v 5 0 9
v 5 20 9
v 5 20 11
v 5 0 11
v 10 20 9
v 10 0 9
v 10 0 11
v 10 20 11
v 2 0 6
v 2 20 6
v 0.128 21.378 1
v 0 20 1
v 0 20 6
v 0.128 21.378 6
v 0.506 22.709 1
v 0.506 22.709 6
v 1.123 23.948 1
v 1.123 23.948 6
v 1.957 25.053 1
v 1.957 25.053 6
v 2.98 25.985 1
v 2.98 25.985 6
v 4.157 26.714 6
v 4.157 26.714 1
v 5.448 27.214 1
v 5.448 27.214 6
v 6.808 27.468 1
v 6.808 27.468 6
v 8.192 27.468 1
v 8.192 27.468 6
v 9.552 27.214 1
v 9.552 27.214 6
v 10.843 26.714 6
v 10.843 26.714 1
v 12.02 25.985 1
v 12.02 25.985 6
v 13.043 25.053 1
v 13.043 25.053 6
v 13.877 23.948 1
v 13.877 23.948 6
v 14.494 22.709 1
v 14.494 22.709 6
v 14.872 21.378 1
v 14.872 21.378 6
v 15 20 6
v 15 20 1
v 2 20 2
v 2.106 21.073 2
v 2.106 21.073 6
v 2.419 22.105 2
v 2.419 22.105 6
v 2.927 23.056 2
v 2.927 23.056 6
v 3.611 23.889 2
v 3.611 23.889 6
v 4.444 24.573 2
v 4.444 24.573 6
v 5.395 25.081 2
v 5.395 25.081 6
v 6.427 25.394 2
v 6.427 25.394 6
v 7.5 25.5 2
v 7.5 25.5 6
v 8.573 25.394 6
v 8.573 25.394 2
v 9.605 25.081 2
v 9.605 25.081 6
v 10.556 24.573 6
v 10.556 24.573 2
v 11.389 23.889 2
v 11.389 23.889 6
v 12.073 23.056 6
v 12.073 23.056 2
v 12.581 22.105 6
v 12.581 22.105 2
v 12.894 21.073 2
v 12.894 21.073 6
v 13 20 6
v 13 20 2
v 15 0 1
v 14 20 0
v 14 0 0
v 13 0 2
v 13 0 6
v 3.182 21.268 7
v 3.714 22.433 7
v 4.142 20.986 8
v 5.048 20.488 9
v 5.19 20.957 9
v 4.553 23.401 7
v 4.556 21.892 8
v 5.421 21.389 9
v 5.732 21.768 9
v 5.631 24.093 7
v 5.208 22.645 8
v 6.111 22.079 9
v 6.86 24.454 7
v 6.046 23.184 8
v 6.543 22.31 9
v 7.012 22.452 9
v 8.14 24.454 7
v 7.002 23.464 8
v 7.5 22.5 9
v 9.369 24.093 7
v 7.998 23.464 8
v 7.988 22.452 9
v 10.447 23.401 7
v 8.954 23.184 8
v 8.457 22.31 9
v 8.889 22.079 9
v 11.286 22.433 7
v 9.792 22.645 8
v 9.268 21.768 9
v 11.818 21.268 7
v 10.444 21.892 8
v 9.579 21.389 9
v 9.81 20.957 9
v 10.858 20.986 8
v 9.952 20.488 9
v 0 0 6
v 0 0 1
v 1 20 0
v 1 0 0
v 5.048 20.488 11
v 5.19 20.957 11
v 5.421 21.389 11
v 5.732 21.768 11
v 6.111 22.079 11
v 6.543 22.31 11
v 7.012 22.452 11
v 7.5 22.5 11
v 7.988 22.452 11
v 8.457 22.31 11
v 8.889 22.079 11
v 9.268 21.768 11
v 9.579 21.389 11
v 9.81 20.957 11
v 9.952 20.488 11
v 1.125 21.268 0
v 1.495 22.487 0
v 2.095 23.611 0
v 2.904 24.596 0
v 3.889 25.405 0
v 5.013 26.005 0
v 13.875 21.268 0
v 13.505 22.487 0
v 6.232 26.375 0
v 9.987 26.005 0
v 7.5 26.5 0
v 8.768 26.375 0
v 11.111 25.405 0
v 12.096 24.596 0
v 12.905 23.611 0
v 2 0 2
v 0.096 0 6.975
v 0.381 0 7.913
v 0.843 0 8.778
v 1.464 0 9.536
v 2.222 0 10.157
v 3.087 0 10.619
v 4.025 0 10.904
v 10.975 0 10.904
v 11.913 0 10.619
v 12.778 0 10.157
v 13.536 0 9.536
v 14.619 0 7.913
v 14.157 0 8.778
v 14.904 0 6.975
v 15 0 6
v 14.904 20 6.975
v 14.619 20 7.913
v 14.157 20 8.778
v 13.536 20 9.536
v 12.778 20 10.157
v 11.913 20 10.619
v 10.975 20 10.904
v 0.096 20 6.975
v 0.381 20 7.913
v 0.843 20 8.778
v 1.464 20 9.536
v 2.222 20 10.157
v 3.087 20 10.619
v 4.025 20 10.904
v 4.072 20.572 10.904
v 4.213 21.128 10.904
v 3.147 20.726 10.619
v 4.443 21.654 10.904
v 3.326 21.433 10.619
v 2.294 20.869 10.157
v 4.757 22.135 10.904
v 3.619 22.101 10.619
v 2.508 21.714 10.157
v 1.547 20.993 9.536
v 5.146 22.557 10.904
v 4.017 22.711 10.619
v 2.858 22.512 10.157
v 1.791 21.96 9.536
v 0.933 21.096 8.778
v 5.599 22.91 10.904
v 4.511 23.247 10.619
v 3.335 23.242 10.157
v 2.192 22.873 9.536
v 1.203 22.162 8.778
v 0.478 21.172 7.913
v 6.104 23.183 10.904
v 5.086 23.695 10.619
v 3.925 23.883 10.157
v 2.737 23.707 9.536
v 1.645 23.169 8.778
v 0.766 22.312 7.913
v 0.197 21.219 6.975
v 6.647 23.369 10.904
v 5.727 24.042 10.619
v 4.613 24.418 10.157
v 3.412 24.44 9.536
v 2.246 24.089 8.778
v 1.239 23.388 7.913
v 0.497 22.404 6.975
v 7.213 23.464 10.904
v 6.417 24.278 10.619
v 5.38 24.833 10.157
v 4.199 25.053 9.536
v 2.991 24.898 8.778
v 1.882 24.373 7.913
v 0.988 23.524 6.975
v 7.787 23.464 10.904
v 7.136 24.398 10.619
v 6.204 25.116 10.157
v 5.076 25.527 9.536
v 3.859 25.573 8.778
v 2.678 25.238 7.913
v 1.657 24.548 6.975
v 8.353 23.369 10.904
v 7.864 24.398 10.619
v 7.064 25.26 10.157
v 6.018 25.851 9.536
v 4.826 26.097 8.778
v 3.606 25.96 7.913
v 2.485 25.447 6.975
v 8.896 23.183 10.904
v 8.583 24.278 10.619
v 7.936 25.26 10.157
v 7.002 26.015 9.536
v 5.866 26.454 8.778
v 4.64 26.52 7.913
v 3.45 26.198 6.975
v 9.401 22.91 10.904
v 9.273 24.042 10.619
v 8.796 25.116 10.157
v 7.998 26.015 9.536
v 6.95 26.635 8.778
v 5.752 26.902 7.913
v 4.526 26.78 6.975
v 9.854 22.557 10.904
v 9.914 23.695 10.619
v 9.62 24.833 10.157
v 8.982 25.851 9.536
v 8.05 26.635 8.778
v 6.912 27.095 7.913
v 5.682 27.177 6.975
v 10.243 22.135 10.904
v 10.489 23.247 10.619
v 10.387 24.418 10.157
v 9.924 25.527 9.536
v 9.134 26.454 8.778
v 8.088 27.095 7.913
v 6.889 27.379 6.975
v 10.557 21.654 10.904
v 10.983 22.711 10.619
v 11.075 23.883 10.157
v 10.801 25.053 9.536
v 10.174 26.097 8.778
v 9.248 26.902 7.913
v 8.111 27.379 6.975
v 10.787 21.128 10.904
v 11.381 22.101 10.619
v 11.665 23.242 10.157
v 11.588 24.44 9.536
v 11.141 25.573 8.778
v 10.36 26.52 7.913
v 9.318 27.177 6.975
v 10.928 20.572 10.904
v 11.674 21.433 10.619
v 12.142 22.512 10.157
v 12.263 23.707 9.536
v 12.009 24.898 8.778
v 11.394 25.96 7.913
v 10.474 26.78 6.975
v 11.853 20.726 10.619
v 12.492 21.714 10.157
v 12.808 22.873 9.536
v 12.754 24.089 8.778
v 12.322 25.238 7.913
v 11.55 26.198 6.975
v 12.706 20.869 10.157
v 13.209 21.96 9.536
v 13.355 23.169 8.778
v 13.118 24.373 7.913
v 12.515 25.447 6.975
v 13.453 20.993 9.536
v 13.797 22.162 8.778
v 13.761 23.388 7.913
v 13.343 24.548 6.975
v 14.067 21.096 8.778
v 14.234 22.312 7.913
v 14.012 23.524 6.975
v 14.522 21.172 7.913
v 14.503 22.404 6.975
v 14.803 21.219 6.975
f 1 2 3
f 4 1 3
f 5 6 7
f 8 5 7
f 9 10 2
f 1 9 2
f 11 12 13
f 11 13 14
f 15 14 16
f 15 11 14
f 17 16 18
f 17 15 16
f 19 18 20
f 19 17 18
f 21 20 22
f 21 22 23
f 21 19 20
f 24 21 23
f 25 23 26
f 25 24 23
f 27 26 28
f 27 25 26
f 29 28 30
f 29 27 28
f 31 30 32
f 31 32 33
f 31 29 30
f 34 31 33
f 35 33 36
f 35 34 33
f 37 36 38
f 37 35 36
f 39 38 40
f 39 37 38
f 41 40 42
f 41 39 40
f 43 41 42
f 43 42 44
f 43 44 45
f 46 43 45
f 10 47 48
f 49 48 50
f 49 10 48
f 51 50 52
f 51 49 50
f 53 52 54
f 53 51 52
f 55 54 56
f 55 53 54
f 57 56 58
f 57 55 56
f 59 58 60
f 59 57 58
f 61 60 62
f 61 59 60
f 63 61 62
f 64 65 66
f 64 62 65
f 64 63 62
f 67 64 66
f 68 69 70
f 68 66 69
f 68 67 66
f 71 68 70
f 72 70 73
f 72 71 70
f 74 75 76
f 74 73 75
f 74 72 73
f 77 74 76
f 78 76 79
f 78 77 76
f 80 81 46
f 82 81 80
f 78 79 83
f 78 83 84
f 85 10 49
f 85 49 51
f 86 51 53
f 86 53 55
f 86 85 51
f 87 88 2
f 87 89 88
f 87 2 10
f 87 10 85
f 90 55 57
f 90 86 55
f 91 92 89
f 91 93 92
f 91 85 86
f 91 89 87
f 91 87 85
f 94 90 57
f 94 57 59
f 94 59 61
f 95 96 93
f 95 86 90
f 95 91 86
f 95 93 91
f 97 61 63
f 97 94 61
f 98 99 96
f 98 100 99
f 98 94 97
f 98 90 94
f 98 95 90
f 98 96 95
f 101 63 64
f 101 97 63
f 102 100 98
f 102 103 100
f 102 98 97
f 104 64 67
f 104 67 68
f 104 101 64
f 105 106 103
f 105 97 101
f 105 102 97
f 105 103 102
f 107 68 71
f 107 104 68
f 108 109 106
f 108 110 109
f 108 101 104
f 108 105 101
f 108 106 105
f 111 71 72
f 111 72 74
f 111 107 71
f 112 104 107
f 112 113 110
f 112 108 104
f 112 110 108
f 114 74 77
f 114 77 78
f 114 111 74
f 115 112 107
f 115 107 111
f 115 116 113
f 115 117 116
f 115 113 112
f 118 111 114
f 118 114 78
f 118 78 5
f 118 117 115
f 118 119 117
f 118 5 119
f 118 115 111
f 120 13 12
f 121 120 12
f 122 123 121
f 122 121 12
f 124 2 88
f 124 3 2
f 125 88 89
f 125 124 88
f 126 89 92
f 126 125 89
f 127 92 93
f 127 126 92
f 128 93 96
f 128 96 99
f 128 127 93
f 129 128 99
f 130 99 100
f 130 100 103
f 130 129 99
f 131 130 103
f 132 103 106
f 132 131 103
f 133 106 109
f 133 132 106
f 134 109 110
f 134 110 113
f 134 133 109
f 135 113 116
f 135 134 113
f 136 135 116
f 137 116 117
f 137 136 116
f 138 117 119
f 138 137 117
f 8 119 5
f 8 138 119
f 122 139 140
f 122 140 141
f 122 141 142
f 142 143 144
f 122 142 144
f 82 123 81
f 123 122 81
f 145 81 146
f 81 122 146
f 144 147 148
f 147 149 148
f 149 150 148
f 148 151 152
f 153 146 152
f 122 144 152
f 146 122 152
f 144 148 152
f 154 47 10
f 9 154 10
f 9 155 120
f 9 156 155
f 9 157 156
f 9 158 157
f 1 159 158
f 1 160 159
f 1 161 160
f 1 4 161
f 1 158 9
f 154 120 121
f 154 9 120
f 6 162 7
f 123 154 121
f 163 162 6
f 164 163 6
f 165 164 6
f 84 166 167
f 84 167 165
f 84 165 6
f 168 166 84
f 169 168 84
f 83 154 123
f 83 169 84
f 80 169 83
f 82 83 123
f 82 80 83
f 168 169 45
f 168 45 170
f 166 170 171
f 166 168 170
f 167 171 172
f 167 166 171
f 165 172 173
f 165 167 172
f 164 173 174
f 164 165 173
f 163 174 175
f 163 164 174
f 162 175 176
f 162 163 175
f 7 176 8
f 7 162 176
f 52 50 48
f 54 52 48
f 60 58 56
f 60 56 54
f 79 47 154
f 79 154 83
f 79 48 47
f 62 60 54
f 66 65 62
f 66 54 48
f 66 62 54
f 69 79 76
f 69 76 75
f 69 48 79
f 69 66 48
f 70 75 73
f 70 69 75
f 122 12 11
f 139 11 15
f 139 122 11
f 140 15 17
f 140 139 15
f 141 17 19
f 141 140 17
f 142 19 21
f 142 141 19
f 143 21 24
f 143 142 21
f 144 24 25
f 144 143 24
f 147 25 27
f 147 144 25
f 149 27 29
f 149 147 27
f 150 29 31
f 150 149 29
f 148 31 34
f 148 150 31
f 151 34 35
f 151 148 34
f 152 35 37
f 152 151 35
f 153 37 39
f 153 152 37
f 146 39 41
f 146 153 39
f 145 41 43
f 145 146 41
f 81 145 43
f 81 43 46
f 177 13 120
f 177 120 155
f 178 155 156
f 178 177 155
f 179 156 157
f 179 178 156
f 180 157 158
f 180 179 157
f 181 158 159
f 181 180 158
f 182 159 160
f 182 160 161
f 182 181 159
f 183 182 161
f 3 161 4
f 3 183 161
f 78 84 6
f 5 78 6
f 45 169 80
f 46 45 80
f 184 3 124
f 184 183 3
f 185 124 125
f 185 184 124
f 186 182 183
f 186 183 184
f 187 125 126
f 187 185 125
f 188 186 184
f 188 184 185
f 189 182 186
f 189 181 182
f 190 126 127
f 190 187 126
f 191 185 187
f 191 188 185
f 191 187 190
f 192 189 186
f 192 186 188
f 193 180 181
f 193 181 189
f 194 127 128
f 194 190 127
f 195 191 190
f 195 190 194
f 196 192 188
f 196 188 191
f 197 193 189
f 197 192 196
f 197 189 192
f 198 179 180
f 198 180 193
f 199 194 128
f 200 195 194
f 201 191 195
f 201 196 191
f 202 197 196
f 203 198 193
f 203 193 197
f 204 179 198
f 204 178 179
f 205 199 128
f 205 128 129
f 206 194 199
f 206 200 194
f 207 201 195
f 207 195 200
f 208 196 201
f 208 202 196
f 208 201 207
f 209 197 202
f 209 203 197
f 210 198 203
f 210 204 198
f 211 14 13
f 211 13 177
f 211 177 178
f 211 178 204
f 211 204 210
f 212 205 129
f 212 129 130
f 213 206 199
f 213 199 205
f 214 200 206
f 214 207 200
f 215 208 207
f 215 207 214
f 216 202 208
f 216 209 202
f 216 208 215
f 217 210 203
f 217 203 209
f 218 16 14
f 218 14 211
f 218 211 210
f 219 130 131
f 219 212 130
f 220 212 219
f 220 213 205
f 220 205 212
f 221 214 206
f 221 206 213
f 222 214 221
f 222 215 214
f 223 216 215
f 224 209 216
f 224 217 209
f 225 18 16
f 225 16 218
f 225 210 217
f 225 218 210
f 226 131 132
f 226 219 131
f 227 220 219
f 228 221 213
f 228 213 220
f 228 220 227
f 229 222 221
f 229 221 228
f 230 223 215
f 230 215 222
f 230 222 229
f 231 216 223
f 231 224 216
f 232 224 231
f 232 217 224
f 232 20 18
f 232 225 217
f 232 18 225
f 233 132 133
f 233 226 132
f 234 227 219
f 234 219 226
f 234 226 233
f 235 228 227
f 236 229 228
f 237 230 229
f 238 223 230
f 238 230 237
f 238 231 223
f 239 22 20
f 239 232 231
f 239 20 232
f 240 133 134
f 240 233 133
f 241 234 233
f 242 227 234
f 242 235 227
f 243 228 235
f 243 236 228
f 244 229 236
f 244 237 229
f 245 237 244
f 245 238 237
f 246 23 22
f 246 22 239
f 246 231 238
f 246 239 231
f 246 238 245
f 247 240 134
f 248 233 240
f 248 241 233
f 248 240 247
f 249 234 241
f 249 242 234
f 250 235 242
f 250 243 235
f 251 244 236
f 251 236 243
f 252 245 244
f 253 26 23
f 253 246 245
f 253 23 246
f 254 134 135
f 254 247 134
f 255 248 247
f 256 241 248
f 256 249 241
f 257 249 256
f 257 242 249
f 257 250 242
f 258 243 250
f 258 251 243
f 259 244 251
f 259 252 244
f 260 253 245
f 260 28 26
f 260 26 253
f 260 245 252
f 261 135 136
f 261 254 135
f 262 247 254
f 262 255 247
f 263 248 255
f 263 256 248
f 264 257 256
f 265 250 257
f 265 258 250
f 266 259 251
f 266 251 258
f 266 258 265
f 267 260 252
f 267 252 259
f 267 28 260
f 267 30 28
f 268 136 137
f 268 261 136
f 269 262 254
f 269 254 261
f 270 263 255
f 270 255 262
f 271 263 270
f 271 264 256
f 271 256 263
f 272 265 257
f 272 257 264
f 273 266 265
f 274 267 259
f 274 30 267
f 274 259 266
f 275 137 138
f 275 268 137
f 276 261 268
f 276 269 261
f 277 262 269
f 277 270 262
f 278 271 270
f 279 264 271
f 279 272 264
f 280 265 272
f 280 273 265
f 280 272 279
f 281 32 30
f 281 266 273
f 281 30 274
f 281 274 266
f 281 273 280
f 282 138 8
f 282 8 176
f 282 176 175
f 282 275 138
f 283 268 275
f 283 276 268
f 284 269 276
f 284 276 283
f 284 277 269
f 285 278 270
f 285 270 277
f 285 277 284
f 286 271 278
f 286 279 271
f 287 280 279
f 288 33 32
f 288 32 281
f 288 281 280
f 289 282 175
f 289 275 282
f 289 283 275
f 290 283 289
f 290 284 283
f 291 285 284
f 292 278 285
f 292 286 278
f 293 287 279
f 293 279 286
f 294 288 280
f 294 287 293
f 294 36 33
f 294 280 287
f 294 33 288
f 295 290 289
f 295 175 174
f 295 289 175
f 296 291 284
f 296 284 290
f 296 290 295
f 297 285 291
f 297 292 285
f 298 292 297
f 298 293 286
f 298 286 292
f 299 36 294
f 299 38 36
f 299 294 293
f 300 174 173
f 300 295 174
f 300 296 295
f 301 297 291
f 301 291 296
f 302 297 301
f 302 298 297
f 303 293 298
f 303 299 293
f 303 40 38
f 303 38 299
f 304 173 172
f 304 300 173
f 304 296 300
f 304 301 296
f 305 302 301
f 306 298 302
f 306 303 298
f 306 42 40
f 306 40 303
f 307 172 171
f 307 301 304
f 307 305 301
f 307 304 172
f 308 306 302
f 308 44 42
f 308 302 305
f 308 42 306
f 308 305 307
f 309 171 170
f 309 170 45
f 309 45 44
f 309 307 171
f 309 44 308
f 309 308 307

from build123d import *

# Parameters (mm, degrees)
F3_DEPTH = 2
F4_SIZE  = 1


with BuildPart() as f2:
    # F2: sweep along a path in F1
    with BuildLine(Plane.XY) as f2_path:
        Line((0, 0), (0, 20))
        ThreePointArc((0, 20), (2.1966991411, 25.3033008589), (7.5, 27.5))
        ThreePointArc((7.5, 27.5), (12.8033008589, 25.3033008589), (15, 20))
        Line((15, 20), (15, 0))
    # F0 (on Front) → F2 (sweep)
    with BuildSketch(Plane.XZ):
        with BuildLine():
            Line((0, 6), (0, 0))
            Line((0, 0), (2, 0))
            Line((2, 0), (2, 6.0000002682))
            Line((2, 6.0000002682), (5, 9.0000002682))
            Line((5, 9.0000002682), (5, 11))
            ThreePointArc((5, 11), (1.4644660941, 9.5355339059), (0, 6))
        make_face()
    sweep(path=f2_path.line)

    # F1 (on Top) → F3 (join)
    with BuildSketch(Plane.XY):
        with BuildLine():
            Line((0, 20), (0, 0))
            Line((0, 0), (7.5, 0))
            Line((7.5, 0), (15, 0))
            Line((15, 0), (15, 20))
            ThreePointArc((15, 20), (12.8033008589, 25.3033008589), (7.5, 27.5))
            ThreePointArc((7.5, 27.5), (2.1966991411, 25.3033008589), (0, 20))
        make_face()
    extrude(amount=F3_DEPTH)

    # F4
    f4_edges = [f2.edges().sort_by_distance(p)[0] for p in [
        (0, 10, 0),
        (7.5, 27.5, 0),
        (15, 10, 0),
    ]]
    chamfer(f4_edges, length=F4_SIZE)


solid = f2.part
